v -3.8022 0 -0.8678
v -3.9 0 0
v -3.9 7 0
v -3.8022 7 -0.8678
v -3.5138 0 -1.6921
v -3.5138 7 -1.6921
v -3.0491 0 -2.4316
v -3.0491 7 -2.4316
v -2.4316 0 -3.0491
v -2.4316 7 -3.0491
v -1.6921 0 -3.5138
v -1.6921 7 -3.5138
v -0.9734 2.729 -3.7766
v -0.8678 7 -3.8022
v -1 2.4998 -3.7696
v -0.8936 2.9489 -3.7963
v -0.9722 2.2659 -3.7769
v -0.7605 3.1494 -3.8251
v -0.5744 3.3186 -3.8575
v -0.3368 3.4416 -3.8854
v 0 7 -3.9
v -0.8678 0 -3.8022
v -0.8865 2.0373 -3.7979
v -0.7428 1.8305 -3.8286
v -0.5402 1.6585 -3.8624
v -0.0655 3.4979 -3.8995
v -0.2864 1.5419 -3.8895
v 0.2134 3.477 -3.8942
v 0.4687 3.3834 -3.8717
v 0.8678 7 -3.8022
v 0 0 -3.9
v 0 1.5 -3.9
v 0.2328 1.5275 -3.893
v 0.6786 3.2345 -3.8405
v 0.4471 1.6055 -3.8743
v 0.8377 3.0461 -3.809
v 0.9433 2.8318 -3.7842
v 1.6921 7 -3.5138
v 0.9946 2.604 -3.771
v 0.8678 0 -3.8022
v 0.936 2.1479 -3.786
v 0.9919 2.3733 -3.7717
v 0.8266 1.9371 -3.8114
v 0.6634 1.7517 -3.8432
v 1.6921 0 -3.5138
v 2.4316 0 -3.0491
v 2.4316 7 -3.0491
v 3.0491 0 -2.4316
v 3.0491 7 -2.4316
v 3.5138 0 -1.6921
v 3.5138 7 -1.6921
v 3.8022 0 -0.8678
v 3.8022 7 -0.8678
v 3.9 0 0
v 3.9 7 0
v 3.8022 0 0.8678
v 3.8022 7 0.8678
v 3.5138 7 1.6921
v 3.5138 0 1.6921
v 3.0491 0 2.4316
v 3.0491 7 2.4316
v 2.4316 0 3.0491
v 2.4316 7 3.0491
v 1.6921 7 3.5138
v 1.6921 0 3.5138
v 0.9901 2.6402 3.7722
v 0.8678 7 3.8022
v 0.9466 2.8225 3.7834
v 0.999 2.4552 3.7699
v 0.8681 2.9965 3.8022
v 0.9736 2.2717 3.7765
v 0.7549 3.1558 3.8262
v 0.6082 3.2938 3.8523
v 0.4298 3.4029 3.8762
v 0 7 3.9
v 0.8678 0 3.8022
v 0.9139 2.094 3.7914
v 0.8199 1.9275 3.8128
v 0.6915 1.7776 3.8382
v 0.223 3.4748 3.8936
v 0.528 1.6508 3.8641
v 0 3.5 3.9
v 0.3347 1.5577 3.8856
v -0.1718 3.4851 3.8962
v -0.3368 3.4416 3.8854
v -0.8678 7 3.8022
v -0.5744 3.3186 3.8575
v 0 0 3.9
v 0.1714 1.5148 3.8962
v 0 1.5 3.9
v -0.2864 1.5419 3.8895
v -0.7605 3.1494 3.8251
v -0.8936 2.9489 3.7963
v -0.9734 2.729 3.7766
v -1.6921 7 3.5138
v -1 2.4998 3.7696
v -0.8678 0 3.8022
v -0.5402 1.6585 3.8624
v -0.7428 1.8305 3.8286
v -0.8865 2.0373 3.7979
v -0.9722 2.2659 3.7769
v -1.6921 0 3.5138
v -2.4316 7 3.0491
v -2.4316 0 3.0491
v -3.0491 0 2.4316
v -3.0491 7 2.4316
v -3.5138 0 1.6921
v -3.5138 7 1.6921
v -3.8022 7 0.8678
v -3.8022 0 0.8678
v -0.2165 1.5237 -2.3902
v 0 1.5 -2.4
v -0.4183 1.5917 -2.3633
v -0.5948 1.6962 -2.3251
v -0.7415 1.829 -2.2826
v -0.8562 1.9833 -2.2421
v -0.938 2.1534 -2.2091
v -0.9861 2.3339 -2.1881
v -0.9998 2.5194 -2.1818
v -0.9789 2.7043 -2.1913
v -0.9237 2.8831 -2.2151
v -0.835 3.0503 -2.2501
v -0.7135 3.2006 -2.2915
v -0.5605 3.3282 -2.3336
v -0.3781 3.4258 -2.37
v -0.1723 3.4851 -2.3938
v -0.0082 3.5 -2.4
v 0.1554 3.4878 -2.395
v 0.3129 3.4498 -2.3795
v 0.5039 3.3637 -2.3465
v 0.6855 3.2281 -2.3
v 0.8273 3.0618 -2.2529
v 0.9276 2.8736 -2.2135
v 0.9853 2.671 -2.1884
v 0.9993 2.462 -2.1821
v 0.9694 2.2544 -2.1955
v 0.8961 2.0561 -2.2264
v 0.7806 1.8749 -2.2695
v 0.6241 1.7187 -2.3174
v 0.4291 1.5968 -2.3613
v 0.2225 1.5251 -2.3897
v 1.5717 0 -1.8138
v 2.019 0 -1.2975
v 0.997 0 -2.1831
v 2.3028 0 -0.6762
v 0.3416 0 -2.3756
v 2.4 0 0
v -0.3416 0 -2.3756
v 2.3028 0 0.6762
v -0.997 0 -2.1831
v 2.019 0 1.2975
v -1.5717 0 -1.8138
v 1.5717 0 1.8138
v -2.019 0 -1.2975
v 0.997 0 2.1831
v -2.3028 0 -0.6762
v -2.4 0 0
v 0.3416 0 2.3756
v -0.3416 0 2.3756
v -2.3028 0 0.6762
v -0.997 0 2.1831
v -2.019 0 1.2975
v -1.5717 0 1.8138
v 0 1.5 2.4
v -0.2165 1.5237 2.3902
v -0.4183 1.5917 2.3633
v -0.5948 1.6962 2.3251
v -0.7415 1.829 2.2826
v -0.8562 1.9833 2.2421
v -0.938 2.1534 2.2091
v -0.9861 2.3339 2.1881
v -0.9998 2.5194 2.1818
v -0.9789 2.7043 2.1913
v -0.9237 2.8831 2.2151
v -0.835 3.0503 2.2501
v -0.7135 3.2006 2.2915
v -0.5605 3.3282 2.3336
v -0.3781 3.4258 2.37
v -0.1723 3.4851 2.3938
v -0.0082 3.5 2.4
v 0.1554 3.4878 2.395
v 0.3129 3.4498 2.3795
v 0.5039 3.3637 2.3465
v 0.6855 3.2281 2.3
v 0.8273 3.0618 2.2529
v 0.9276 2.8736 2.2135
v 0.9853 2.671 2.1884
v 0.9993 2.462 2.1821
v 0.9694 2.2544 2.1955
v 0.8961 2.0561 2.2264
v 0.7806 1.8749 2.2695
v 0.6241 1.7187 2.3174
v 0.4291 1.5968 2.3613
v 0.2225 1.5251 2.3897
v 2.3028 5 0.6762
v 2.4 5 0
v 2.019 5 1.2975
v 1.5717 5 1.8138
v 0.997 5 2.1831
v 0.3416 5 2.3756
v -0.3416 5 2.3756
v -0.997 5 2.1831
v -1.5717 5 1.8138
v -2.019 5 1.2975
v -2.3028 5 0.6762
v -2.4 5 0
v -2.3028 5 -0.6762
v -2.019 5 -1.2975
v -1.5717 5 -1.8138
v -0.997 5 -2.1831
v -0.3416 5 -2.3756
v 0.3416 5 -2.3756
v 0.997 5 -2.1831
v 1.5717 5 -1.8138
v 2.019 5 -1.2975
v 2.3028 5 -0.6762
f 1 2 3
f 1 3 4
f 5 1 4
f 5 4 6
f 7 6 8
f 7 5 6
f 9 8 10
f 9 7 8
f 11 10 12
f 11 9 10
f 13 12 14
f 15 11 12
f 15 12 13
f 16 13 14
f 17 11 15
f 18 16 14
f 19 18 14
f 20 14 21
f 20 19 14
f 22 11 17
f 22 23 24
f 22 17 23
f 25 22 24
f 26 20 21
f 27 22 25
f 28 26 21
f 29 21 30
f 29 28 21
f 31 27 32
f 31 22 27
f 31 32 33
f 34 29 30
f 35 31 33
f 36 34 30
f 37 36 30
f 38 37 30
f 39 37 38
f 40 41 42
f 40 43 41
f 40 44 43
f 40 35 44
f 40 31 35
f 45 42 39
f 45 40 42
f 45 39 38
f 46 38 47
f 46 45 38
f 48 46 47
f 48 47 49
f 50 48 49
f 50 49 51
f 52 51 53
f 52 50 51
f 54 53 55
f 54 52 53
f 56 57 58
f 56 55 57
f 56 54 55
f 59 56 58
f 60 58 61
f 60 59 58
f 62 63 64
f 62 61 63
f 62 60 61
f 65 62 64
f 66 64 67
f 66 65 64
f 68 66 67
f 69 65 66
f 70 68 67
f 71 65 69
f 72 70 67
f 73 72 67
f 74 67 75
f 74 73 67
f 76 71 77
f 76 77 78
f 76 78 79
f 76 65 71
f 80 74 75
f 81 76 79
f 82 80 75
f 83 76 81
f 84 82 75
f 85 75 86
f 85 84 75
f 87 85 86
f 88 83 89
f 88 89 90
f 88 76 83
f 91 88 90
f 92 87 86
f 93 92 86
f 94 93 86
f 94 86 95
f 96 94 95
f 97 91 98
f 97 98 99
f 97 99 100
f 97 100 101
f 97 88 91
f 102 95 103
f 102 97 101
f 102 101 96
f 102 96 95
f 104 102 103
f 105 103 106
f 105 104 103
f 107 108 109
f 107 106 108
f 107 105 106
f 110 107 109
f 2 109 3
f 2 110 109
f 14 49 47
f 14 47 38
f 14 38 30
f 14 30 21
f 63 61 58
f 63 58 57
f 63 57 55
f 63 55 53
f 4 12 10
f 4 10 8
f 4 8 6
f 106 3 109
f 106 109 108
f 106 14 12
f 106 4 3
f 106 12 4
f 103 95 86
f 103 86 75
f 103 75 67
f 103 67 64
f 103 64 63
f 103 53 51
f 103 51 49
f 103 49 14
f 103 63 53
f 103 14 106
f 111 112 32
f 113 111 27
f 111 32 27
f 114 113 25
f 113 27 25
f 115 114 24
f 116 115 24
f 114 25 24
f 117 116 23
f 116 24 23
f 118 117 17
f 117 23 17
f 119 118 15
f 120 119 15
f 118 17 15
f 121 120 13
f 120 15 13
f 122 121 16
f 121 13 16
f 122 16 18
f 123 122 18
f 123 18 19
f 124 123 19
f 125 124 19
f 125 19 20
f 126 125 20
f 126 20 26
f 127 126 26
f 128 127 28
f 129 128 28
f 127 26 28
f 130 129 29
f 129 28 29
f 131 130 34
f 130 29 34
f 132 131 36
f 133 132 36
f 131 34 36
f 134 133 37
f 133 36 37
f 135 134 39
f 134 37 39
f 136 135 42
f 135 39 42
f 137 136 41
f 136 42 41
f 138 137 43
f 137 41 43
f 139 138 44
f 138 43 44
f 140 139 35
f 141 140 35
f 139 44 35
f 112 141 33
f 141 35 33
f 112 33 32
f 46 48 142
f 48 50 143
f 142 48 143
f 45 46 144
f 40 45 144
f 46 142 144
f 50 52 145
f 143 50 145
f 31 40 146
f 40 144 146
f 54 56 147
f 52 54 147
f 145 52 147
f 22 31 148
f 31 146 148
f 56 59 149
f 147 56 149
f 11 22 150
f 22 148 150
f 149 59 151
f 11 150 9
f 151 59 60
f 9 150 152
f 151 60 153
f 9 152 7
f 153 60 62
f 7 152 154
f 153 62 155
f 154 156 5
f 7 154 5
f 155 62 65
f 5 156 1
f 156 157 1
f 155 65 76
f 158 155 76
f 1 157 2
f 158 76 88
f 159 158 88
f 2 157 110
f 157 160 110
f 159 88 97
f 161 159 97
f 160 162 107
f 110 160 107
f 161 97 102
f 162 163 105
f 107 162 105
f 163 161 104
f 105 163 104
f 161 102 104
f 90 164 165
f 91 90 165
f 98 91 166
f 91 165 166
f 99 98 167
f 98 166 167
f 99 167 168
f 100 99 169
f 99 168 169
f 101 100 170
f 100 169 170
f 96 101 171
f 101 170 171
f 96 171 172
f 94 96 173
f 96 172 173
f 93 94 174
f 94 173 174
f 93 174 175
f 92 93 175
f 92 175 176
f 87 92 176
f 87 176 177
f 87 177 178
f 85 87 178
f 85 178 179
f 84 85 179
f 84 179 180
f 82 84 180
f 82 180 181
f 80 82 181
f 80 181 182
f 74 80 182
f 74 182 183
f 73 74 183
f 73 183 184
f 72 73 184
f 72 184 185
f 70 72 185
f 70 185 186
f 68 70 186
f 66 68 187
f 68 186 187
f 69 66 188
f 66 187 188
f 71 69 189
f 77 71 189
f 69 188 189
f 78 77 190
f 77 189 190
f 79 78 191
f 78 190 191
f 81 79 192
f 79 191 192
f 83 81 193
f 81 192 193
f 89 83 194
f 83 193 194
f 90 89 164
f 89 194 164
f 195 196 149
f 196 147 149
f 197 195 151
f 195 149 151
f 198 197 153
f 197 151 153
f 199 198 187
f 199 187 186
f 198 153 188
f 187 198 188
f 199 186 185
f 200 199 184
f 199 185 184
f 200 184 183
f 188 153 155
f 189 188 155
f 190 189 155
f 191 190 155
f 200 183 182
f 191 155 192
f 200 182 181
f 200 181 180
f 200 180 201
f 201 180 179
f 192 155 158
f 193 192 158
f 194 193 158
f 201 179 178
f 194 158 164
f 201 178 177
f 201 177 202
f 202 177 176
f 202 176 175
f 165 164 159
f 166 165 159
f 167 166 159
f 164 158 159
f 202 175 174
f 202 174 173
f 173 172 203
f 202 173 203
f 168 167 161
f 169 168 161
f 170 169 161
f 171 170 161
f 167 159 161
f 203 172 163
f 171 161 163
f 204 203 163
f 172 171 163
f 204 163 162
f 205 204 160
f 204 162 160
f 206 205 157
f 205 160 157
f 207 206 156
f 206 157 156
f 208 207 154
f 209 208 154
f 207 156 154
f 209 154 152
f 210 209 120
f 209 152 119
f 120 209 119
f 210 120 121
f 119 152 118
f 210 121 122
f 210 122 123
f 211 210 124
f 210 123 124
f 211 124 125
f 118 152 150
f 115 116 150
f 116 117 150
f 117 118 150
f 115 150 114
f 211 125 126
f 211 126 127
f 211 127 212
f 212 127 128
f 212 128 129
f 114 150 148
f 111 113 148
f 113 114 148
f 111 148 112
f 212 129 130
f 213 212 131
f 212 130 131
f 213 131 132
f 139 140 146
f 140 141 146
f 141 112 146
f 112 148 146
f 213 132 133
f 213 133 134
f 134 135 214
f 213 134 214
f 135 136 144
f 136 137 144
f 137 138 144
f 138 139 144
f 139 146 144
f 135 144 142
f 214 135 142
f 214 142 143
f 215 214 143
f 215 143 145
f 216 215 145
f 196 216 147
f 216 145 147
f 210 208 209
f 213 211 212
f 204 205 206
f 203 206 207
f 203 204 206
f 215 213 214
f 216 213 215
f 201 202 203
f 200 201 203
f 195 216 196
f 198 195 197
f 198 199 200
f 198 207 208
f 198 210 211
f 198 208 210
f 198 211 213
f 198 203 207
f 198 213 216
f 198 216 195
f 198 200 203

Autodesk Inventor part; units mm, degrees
ref_plane "YZ Plane" through (0, 0, 0) normal (1, 0, 0) x (0, 1, 0)
ref_plane "XZ Plane" through (0, 0, 0) normal (0, 1, 0) x (-1, 0, 0)
sketch "Sketch1" plane through (0, 0, 0) normal (0, 1, 0) x (-1, 0, 0)
  circle A0 centre (0, 0) radius 3.9
  dimension "d0" = 7.8
extrude "Extrusion1" add sketch "Sketch1" along normal blind 7
sketch "Sketch5" plane through (0, 0, 0) normal (0, -1, 0) x (1, 0, 0)
  circle A0 centre (0, 0) radius 2.4
  dimension "d22" = 4.8
extrude "Extrusion3" cut sketch "Sketch5" against normal blind 5
ref_plane "Work Plane1" through (0, 0, 3.9) normal (0, 0, 1) x (1, 0, 0)
sketch "Sketch2" plane through (0, 0, 3.9) normal (0, 0, 1) x (1, 0, 0)
  line L0 (0, 0) -> (0, 2.5) construction
  line L1 (3.9, 0) -> (-3.9, 0) construction
  dimension "d21" = 2.5
hole "Hole1" at (0, 2.5, 3.9) direction (0, 0, -1) diameter 2 end through all
properties part number "Lego_Frame_Holder"
